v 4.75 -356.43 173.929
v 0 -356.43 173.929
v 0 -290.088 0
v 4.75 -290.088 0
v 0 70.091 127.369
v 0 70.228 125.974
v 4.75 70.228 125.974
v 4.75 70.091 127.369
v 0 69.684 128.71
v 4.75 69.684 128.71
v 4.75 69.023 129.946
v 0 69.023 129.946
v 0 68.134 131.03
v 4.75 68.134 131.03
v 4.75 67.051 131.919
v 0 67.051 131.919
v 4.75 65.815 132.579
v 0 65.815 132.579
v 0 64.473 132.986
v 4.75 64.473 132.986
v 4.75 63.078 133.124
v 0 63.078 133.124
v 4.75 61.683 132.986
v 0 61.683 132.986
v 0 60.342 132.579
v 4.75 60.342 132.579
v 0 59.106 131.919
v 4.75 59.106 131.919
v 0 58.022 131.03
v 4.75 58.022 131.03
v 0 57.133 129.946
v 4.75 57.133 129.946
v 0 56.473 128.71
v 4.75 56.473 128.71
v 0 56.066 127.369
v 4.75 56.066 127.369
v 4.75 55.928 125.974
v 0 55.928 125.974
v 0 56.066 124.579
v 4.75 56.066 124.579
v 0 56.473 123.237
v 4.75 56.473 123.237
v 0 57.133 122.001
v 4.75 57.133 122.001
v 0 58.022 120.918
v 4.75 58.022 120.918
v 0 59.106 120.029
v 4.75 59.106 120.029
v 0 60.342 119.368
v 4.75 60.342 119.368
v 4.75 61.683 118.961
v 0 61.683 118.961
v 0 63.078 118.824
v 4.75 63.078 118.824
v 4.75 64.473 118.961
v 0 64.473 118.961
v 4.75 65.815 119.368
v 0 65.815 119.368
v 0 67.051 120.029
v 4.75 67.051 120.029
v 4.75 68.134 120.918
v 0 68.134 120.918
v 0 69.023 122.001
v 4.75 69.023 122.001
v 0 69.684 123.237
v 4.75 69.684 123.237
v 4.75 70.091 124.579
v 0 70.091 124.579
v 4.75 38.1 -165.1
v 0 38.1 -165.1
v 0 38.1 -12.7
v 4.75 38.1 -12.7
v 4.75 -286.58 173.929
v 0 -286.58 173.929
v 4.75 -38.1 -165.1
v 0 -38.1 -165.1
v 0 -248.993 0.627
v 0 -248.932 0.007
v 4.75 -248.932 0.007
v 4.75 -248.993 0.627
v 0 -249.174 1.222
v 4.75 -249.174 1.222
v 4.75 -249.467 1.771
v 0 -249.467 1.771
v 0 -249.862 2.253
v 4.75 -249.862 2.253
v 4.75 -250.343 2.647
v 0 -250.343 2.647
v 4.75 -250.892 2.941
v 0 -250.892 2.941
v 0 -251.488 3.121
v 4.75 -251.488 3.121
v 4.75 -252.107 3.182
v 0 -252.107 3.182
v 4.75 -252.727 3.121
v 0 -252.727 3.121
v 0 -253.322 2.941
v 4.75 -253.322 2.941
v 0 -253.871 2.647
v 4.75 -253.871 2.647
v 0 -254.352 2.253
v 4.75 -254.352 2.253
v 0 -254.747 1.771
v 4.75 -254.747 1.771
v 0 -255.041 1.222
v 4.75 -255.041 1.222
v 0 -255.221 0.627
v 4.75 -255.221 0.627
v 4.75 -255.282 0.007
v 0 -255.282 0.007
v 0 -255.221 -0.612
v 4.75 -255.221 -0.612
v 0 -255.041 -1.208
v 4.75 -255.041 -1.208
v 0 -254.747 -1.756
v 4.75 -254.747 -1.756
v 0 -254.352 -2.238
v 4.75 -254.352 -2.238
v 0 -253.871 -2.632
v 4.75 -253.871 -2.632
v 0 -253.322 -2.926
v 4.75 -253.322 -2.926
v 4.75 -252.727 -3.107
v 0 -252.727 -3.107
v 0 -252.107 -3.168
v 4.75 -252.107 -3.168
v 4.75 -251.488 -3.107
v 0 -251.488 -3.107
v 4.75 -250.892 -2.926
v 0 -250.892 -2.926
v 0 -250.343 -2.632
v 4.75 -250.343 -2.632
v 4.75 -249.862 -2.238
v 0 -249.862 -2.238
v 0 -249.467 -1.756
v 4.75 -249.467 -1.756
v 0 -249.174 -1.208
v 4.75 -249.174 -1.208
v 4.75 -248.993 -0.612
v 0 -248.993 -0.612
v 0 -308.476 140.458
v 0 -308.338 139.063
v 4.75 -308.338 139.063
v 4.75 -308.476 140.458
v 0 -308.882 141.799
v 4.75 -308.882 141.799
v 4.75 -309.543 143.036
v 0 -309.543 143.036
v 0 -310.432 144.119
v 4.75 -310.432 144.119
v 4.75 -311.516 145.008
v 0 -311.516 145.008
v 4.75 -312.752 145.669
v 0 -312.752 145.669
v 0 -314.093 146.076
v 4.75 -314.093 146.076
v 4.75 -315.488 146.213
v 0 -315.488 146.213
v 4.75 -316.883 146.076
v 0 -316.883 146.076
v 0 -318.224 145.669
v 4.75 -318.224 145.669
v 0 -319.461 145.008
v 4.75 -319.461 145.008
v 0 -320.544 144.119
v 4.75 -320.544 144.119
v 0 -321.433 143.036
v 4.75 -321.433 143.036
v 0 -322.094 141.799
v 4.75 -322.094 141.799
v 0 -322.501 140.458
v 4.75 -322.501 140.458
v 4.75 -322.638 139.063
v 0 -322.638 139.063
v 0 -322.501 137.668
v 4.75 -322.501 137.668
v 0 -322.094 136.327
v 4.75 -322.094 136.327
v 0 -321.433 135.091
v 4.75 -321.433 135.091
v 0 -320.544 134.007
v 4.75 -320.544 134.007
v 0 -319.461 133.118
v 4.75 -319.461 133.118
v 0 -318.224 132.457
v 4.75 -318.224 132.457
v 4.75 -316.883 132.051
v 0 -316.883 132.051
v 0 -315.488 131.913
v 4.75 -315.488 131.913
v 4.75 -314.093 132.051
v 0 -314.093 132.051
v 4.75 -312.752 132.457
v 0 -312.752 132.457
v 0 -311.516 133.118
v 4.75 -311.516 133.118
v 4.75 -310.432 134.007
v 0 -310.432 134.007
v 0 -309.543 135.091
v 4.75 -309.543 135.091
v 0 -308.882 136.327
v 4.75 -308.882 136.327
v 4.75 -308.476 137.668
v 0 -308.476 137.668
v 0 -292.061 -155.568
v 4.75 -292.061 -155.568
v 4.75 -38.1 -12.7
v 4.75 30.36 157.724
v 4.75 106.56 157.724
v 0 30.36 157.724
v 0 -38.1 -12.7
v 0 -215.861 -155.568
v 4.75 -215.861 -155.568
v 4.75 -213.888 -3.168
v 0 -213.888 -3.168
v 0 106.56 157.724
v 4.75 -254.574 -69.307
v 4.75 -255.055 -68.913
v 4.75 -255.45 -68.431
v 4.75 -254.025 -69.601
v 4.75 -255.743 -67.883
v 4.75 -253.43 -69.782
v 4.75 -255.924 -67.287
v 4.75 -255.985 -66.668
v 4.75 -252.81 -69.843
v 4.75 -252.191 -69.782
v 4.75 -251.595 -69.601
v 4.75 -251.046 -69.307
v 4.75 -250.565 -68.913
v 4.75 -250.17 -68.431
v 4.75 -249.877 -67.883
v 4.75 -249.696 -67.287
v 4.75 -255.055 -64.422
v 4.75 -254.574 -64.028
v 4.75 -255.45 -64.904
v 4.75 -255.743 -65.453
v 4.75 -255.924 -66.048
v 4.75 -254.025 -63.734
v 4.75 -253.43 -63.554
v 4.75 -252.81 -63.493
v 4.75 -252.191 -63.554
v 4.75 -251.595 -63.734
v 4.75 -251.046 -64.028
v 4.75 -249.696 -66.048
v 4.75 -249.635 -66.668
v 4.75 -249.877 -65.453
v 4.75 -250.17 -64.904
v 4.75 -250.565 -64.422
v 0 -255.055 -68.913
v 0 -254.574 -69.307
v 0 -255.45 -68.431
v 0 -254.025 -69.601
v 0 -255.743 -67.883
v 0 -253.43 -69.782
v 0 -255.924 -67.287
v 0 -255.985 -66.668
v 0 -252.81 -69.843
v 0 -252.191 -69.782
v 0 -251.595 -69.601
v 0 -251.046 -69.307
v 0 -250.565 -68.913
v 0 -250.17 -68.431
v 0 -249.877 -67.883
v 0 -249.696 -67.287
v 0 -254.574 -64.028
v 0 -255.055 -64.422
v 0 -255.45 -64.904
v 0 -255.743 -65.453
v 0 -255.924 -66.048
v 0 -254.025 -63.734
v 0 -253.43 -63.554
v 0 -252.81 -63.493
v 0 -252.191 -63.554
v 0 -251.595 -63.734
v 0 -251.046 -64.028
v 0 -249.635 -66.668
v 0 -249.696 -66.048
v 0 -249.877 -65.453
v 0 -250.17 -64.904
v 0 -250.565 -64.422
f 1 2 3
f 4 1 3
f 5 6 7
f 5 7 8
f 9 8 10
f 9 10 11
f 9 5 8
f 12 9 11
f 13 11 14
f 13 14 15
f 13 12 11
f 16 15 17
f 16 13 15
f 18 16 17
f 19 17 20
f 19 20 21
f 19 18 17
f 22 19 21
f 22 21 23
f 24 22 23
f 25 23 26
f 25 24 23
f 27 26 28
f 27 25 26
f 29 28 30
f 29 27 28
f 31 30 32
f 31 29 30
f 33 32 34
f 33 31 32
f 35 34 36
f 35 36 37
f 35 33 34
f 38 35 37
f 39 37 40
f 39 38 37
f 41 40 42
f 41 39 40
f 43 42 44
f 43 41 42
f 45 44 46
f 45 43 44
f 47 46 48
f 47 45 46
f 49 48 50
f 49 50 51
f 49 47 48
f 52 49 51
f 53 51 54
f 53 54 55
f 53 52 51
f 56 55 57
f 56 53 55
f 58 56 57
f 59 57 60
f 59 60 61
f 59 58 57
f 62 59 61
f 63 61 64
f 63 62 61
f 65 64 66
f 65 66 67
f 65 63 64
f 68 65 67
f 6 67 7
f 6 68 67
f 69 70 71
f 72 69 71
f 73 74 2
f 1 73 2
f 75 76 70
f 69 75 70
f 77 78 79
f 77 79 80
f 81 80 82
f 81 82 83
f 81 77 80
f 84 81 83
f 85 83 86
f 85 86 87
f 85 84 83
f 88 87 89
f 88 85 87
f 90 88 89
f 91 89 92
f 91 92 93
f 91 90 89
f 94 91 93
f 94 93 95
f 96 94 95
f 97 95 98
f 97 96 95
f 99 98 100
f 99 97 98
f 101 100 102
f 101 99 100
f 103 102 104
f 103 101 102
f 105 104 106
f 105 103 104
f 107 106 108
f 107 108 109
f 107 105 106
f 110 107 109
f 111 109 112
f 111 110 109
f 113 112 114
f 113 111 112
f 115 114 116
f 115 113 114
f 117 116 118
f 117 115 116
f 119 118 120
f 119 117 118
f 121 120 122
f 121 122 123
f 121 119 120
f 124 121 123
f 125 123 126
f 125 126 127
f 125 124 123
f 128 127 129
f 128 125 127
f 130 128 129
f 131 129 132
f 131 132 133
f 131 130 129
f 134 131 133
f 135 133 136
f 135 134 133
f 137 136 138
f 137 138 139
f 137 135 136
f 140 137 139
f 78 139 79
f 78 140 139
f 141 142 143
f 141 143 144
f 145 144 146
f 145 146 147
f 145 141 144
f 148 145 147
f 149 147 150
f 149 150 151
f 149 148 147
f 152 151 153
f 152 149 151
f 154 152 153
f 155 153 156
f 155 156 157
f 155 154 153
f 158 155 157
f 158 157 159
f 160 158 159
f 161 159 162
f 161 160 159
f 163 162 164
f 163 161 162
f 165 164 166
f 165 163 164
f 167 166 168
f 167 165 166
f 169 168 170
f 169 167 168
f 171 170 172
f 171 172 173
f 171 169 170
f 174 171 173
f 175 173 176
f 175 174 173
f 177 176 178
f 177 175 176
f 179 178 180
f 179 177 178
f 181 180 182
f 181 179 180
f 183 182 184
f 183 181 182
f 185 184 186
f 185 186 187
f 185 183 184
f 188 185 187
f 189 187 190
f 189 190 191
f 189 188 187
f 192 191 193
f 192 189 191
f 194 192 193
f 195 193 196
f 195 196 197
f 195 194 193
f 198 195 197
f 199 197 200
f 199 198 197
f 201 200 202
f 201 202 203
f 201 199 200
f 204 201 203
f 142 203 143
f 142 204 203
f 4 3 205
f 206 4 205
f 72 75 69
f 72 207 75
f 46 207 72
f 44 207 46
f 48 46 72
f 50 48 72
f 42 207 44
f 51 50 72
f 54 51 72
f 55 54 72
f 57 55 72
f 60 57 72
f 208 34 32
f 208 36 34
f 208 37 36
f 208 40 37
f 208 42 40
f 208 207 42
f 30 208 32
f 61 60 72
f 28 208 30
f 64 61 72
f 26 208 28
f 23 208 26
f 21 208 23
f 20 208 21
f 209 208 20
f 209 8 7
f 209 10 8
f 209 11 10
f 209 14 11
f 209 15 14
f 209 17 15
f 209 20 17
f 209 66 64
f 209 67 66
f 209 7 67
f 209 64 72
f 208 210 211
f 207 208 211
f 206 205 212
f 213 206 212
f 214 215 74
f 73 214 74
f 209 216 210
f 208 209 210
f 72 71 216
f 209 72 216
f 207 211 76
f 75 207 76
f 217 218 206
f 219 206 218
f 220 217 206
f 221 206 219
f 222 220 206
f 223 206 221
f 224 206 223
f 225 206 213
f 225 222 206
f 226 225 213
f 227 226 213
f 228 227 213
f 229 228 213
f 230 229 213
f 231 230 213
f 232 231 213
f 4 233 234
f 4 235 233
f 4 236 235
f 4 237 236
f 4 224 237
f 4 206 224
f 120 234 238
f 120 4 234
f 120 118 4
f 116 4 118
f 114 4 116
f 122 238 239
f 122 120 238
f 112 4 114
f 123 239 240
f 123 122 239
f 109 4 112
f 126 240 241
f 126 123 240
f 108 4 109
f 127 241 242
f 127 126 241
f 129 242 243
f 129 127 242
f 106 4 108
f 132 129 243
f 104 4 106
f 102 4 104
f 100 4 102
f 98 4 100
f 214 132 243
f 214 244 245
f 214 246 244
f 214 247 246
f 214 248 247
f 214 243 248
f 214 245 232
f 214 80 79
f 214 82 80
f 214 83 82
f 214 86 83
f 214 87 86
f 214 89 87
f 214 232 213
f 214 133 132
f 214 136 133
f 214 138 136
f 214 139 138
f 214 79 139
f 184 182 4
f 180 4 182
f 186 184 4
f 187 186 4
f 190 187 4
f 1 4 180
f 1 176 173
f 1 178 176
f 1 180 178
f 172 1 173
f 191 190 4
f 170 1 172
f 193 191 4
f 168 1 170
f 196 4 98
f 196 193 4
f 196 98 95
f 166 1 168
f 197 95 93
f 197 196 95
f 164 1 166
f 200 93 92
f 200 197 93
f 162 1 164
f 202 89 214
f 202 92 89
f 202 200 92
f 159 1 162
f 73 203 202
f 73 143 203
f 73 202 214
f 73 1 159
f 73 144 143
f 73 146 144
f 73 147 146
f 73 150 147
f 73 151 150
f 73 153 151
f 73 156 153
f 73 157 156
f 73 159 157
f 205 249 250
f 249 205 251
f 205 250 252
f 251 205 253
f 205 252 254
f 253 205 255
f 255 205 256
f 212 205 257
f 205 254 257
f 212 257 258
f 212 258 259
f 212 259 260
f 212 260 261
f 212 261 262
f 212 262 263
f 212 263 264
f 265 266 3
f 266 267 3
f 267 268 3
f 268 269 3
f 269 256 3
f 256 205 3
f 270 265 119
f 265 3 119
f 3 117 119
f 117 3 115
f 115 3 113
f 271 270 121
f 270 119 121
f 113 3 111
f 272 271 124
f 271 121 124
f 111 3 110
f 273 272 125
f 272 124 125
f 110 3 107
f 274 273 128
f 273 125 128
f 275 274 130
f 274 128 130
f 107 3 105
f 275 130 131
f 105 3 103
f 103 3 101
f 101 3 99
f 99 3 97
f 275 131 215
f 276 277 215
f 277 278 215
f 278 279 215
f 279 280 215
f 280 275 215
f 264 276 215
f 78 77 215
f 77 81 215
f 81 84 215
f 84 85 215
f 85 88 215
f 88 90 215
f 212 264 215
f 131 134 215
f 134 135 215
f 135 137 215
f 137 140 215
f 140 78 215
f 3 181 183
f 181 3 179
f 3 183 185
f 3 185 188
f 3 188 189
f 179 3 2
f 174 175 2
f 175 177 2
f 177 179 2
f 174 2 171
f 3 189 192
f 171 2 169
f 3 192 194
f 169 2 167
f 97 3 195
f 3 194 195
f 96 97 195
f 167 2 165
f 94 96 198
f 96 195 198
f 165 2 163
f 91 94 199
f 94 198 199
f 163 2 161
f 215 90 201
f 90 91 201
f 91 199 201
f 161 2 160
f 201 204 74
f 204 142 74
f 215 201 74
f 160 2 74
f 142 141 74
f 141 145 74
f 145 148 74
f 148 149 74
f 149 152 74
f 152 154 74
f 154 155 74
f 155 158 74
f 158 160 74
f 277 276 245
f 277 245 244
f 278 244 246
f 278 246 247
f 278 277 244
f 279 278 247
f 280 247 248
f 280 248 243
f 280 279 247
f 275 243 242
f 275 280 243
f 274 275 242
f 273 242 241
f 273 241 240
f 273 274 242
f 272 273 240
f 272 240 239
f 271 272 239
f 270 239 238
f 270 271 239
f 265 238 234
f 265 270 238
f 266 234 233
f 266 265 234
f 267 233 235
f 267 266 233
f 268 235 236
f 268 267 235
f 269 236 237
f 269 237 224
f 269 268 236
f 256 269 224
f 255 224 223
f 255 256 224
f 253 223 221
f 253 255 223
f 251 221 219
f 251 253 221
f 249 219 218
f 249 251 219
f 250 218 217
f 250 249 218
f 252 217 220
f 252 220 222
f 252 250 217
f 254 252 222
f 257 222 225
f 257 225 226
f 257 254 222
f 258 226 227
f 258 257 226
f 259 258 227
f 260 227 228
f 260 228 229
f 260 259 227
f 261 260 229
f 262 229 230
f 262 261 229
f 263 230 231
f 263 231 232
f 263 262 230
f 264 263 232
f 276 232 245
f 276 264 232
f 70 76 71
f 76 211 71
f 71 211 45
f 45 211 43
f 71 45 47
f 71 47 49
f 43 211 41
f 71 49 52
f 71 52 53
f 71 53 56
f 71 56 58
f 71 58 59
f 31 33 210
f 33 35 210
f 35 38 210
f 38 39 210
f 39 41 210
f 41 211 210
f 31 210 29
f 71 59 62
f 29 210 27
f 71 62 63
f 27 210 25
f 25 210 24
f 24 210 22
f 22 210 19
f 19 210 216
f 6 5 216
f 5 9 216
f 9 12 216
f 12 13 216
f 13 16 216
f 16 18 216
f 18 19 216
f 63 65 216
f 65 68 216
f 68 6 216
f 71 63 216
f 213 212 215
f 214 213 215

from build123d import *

# Parameters (mm, degrees)
F0_R     = 7.1501
F0_R_2   = 3.175
F1_DEPTH = 4.7498


with BuildPart() as f1:
    # F0 (on Right) → F1 (new body)
    with BuildSketch(Plane.YZ):
        Polygon((-38.1, -165.1), (38.1, -165.1), (38.1, -12.7), (106.559555, 157.723664), (30.359555, 157.723664), (-38.1, -12.7), align=None)
        with Locations((63.078348, 125.973664)):
            Circle(F0_R, mode=Mode.SUBTRACT)
        Polygon((-292.060516, -155.567557), (-215.860516, -155.567557), (-213.88826, -3.167552), (-286.580233, 173.92881), (-356.430233, 173.92881), (-290.08826, 0), align=None)
        with Locations((-252.810129, -66.667557)):
            Circle(F0_R_2, mode=Mode.SUBTRACT)
        with Locations((-252.107382, 0.007443)):
            Circle(F0_R_2, mode=Mode.SUBTRACT)
        with Locations((-315.48826, 139.063232)):
            Circle(F0_R, mode=Mode.SUBTRACT)
    extrude(amount=F1_DEPTH)


solid = f1.part
